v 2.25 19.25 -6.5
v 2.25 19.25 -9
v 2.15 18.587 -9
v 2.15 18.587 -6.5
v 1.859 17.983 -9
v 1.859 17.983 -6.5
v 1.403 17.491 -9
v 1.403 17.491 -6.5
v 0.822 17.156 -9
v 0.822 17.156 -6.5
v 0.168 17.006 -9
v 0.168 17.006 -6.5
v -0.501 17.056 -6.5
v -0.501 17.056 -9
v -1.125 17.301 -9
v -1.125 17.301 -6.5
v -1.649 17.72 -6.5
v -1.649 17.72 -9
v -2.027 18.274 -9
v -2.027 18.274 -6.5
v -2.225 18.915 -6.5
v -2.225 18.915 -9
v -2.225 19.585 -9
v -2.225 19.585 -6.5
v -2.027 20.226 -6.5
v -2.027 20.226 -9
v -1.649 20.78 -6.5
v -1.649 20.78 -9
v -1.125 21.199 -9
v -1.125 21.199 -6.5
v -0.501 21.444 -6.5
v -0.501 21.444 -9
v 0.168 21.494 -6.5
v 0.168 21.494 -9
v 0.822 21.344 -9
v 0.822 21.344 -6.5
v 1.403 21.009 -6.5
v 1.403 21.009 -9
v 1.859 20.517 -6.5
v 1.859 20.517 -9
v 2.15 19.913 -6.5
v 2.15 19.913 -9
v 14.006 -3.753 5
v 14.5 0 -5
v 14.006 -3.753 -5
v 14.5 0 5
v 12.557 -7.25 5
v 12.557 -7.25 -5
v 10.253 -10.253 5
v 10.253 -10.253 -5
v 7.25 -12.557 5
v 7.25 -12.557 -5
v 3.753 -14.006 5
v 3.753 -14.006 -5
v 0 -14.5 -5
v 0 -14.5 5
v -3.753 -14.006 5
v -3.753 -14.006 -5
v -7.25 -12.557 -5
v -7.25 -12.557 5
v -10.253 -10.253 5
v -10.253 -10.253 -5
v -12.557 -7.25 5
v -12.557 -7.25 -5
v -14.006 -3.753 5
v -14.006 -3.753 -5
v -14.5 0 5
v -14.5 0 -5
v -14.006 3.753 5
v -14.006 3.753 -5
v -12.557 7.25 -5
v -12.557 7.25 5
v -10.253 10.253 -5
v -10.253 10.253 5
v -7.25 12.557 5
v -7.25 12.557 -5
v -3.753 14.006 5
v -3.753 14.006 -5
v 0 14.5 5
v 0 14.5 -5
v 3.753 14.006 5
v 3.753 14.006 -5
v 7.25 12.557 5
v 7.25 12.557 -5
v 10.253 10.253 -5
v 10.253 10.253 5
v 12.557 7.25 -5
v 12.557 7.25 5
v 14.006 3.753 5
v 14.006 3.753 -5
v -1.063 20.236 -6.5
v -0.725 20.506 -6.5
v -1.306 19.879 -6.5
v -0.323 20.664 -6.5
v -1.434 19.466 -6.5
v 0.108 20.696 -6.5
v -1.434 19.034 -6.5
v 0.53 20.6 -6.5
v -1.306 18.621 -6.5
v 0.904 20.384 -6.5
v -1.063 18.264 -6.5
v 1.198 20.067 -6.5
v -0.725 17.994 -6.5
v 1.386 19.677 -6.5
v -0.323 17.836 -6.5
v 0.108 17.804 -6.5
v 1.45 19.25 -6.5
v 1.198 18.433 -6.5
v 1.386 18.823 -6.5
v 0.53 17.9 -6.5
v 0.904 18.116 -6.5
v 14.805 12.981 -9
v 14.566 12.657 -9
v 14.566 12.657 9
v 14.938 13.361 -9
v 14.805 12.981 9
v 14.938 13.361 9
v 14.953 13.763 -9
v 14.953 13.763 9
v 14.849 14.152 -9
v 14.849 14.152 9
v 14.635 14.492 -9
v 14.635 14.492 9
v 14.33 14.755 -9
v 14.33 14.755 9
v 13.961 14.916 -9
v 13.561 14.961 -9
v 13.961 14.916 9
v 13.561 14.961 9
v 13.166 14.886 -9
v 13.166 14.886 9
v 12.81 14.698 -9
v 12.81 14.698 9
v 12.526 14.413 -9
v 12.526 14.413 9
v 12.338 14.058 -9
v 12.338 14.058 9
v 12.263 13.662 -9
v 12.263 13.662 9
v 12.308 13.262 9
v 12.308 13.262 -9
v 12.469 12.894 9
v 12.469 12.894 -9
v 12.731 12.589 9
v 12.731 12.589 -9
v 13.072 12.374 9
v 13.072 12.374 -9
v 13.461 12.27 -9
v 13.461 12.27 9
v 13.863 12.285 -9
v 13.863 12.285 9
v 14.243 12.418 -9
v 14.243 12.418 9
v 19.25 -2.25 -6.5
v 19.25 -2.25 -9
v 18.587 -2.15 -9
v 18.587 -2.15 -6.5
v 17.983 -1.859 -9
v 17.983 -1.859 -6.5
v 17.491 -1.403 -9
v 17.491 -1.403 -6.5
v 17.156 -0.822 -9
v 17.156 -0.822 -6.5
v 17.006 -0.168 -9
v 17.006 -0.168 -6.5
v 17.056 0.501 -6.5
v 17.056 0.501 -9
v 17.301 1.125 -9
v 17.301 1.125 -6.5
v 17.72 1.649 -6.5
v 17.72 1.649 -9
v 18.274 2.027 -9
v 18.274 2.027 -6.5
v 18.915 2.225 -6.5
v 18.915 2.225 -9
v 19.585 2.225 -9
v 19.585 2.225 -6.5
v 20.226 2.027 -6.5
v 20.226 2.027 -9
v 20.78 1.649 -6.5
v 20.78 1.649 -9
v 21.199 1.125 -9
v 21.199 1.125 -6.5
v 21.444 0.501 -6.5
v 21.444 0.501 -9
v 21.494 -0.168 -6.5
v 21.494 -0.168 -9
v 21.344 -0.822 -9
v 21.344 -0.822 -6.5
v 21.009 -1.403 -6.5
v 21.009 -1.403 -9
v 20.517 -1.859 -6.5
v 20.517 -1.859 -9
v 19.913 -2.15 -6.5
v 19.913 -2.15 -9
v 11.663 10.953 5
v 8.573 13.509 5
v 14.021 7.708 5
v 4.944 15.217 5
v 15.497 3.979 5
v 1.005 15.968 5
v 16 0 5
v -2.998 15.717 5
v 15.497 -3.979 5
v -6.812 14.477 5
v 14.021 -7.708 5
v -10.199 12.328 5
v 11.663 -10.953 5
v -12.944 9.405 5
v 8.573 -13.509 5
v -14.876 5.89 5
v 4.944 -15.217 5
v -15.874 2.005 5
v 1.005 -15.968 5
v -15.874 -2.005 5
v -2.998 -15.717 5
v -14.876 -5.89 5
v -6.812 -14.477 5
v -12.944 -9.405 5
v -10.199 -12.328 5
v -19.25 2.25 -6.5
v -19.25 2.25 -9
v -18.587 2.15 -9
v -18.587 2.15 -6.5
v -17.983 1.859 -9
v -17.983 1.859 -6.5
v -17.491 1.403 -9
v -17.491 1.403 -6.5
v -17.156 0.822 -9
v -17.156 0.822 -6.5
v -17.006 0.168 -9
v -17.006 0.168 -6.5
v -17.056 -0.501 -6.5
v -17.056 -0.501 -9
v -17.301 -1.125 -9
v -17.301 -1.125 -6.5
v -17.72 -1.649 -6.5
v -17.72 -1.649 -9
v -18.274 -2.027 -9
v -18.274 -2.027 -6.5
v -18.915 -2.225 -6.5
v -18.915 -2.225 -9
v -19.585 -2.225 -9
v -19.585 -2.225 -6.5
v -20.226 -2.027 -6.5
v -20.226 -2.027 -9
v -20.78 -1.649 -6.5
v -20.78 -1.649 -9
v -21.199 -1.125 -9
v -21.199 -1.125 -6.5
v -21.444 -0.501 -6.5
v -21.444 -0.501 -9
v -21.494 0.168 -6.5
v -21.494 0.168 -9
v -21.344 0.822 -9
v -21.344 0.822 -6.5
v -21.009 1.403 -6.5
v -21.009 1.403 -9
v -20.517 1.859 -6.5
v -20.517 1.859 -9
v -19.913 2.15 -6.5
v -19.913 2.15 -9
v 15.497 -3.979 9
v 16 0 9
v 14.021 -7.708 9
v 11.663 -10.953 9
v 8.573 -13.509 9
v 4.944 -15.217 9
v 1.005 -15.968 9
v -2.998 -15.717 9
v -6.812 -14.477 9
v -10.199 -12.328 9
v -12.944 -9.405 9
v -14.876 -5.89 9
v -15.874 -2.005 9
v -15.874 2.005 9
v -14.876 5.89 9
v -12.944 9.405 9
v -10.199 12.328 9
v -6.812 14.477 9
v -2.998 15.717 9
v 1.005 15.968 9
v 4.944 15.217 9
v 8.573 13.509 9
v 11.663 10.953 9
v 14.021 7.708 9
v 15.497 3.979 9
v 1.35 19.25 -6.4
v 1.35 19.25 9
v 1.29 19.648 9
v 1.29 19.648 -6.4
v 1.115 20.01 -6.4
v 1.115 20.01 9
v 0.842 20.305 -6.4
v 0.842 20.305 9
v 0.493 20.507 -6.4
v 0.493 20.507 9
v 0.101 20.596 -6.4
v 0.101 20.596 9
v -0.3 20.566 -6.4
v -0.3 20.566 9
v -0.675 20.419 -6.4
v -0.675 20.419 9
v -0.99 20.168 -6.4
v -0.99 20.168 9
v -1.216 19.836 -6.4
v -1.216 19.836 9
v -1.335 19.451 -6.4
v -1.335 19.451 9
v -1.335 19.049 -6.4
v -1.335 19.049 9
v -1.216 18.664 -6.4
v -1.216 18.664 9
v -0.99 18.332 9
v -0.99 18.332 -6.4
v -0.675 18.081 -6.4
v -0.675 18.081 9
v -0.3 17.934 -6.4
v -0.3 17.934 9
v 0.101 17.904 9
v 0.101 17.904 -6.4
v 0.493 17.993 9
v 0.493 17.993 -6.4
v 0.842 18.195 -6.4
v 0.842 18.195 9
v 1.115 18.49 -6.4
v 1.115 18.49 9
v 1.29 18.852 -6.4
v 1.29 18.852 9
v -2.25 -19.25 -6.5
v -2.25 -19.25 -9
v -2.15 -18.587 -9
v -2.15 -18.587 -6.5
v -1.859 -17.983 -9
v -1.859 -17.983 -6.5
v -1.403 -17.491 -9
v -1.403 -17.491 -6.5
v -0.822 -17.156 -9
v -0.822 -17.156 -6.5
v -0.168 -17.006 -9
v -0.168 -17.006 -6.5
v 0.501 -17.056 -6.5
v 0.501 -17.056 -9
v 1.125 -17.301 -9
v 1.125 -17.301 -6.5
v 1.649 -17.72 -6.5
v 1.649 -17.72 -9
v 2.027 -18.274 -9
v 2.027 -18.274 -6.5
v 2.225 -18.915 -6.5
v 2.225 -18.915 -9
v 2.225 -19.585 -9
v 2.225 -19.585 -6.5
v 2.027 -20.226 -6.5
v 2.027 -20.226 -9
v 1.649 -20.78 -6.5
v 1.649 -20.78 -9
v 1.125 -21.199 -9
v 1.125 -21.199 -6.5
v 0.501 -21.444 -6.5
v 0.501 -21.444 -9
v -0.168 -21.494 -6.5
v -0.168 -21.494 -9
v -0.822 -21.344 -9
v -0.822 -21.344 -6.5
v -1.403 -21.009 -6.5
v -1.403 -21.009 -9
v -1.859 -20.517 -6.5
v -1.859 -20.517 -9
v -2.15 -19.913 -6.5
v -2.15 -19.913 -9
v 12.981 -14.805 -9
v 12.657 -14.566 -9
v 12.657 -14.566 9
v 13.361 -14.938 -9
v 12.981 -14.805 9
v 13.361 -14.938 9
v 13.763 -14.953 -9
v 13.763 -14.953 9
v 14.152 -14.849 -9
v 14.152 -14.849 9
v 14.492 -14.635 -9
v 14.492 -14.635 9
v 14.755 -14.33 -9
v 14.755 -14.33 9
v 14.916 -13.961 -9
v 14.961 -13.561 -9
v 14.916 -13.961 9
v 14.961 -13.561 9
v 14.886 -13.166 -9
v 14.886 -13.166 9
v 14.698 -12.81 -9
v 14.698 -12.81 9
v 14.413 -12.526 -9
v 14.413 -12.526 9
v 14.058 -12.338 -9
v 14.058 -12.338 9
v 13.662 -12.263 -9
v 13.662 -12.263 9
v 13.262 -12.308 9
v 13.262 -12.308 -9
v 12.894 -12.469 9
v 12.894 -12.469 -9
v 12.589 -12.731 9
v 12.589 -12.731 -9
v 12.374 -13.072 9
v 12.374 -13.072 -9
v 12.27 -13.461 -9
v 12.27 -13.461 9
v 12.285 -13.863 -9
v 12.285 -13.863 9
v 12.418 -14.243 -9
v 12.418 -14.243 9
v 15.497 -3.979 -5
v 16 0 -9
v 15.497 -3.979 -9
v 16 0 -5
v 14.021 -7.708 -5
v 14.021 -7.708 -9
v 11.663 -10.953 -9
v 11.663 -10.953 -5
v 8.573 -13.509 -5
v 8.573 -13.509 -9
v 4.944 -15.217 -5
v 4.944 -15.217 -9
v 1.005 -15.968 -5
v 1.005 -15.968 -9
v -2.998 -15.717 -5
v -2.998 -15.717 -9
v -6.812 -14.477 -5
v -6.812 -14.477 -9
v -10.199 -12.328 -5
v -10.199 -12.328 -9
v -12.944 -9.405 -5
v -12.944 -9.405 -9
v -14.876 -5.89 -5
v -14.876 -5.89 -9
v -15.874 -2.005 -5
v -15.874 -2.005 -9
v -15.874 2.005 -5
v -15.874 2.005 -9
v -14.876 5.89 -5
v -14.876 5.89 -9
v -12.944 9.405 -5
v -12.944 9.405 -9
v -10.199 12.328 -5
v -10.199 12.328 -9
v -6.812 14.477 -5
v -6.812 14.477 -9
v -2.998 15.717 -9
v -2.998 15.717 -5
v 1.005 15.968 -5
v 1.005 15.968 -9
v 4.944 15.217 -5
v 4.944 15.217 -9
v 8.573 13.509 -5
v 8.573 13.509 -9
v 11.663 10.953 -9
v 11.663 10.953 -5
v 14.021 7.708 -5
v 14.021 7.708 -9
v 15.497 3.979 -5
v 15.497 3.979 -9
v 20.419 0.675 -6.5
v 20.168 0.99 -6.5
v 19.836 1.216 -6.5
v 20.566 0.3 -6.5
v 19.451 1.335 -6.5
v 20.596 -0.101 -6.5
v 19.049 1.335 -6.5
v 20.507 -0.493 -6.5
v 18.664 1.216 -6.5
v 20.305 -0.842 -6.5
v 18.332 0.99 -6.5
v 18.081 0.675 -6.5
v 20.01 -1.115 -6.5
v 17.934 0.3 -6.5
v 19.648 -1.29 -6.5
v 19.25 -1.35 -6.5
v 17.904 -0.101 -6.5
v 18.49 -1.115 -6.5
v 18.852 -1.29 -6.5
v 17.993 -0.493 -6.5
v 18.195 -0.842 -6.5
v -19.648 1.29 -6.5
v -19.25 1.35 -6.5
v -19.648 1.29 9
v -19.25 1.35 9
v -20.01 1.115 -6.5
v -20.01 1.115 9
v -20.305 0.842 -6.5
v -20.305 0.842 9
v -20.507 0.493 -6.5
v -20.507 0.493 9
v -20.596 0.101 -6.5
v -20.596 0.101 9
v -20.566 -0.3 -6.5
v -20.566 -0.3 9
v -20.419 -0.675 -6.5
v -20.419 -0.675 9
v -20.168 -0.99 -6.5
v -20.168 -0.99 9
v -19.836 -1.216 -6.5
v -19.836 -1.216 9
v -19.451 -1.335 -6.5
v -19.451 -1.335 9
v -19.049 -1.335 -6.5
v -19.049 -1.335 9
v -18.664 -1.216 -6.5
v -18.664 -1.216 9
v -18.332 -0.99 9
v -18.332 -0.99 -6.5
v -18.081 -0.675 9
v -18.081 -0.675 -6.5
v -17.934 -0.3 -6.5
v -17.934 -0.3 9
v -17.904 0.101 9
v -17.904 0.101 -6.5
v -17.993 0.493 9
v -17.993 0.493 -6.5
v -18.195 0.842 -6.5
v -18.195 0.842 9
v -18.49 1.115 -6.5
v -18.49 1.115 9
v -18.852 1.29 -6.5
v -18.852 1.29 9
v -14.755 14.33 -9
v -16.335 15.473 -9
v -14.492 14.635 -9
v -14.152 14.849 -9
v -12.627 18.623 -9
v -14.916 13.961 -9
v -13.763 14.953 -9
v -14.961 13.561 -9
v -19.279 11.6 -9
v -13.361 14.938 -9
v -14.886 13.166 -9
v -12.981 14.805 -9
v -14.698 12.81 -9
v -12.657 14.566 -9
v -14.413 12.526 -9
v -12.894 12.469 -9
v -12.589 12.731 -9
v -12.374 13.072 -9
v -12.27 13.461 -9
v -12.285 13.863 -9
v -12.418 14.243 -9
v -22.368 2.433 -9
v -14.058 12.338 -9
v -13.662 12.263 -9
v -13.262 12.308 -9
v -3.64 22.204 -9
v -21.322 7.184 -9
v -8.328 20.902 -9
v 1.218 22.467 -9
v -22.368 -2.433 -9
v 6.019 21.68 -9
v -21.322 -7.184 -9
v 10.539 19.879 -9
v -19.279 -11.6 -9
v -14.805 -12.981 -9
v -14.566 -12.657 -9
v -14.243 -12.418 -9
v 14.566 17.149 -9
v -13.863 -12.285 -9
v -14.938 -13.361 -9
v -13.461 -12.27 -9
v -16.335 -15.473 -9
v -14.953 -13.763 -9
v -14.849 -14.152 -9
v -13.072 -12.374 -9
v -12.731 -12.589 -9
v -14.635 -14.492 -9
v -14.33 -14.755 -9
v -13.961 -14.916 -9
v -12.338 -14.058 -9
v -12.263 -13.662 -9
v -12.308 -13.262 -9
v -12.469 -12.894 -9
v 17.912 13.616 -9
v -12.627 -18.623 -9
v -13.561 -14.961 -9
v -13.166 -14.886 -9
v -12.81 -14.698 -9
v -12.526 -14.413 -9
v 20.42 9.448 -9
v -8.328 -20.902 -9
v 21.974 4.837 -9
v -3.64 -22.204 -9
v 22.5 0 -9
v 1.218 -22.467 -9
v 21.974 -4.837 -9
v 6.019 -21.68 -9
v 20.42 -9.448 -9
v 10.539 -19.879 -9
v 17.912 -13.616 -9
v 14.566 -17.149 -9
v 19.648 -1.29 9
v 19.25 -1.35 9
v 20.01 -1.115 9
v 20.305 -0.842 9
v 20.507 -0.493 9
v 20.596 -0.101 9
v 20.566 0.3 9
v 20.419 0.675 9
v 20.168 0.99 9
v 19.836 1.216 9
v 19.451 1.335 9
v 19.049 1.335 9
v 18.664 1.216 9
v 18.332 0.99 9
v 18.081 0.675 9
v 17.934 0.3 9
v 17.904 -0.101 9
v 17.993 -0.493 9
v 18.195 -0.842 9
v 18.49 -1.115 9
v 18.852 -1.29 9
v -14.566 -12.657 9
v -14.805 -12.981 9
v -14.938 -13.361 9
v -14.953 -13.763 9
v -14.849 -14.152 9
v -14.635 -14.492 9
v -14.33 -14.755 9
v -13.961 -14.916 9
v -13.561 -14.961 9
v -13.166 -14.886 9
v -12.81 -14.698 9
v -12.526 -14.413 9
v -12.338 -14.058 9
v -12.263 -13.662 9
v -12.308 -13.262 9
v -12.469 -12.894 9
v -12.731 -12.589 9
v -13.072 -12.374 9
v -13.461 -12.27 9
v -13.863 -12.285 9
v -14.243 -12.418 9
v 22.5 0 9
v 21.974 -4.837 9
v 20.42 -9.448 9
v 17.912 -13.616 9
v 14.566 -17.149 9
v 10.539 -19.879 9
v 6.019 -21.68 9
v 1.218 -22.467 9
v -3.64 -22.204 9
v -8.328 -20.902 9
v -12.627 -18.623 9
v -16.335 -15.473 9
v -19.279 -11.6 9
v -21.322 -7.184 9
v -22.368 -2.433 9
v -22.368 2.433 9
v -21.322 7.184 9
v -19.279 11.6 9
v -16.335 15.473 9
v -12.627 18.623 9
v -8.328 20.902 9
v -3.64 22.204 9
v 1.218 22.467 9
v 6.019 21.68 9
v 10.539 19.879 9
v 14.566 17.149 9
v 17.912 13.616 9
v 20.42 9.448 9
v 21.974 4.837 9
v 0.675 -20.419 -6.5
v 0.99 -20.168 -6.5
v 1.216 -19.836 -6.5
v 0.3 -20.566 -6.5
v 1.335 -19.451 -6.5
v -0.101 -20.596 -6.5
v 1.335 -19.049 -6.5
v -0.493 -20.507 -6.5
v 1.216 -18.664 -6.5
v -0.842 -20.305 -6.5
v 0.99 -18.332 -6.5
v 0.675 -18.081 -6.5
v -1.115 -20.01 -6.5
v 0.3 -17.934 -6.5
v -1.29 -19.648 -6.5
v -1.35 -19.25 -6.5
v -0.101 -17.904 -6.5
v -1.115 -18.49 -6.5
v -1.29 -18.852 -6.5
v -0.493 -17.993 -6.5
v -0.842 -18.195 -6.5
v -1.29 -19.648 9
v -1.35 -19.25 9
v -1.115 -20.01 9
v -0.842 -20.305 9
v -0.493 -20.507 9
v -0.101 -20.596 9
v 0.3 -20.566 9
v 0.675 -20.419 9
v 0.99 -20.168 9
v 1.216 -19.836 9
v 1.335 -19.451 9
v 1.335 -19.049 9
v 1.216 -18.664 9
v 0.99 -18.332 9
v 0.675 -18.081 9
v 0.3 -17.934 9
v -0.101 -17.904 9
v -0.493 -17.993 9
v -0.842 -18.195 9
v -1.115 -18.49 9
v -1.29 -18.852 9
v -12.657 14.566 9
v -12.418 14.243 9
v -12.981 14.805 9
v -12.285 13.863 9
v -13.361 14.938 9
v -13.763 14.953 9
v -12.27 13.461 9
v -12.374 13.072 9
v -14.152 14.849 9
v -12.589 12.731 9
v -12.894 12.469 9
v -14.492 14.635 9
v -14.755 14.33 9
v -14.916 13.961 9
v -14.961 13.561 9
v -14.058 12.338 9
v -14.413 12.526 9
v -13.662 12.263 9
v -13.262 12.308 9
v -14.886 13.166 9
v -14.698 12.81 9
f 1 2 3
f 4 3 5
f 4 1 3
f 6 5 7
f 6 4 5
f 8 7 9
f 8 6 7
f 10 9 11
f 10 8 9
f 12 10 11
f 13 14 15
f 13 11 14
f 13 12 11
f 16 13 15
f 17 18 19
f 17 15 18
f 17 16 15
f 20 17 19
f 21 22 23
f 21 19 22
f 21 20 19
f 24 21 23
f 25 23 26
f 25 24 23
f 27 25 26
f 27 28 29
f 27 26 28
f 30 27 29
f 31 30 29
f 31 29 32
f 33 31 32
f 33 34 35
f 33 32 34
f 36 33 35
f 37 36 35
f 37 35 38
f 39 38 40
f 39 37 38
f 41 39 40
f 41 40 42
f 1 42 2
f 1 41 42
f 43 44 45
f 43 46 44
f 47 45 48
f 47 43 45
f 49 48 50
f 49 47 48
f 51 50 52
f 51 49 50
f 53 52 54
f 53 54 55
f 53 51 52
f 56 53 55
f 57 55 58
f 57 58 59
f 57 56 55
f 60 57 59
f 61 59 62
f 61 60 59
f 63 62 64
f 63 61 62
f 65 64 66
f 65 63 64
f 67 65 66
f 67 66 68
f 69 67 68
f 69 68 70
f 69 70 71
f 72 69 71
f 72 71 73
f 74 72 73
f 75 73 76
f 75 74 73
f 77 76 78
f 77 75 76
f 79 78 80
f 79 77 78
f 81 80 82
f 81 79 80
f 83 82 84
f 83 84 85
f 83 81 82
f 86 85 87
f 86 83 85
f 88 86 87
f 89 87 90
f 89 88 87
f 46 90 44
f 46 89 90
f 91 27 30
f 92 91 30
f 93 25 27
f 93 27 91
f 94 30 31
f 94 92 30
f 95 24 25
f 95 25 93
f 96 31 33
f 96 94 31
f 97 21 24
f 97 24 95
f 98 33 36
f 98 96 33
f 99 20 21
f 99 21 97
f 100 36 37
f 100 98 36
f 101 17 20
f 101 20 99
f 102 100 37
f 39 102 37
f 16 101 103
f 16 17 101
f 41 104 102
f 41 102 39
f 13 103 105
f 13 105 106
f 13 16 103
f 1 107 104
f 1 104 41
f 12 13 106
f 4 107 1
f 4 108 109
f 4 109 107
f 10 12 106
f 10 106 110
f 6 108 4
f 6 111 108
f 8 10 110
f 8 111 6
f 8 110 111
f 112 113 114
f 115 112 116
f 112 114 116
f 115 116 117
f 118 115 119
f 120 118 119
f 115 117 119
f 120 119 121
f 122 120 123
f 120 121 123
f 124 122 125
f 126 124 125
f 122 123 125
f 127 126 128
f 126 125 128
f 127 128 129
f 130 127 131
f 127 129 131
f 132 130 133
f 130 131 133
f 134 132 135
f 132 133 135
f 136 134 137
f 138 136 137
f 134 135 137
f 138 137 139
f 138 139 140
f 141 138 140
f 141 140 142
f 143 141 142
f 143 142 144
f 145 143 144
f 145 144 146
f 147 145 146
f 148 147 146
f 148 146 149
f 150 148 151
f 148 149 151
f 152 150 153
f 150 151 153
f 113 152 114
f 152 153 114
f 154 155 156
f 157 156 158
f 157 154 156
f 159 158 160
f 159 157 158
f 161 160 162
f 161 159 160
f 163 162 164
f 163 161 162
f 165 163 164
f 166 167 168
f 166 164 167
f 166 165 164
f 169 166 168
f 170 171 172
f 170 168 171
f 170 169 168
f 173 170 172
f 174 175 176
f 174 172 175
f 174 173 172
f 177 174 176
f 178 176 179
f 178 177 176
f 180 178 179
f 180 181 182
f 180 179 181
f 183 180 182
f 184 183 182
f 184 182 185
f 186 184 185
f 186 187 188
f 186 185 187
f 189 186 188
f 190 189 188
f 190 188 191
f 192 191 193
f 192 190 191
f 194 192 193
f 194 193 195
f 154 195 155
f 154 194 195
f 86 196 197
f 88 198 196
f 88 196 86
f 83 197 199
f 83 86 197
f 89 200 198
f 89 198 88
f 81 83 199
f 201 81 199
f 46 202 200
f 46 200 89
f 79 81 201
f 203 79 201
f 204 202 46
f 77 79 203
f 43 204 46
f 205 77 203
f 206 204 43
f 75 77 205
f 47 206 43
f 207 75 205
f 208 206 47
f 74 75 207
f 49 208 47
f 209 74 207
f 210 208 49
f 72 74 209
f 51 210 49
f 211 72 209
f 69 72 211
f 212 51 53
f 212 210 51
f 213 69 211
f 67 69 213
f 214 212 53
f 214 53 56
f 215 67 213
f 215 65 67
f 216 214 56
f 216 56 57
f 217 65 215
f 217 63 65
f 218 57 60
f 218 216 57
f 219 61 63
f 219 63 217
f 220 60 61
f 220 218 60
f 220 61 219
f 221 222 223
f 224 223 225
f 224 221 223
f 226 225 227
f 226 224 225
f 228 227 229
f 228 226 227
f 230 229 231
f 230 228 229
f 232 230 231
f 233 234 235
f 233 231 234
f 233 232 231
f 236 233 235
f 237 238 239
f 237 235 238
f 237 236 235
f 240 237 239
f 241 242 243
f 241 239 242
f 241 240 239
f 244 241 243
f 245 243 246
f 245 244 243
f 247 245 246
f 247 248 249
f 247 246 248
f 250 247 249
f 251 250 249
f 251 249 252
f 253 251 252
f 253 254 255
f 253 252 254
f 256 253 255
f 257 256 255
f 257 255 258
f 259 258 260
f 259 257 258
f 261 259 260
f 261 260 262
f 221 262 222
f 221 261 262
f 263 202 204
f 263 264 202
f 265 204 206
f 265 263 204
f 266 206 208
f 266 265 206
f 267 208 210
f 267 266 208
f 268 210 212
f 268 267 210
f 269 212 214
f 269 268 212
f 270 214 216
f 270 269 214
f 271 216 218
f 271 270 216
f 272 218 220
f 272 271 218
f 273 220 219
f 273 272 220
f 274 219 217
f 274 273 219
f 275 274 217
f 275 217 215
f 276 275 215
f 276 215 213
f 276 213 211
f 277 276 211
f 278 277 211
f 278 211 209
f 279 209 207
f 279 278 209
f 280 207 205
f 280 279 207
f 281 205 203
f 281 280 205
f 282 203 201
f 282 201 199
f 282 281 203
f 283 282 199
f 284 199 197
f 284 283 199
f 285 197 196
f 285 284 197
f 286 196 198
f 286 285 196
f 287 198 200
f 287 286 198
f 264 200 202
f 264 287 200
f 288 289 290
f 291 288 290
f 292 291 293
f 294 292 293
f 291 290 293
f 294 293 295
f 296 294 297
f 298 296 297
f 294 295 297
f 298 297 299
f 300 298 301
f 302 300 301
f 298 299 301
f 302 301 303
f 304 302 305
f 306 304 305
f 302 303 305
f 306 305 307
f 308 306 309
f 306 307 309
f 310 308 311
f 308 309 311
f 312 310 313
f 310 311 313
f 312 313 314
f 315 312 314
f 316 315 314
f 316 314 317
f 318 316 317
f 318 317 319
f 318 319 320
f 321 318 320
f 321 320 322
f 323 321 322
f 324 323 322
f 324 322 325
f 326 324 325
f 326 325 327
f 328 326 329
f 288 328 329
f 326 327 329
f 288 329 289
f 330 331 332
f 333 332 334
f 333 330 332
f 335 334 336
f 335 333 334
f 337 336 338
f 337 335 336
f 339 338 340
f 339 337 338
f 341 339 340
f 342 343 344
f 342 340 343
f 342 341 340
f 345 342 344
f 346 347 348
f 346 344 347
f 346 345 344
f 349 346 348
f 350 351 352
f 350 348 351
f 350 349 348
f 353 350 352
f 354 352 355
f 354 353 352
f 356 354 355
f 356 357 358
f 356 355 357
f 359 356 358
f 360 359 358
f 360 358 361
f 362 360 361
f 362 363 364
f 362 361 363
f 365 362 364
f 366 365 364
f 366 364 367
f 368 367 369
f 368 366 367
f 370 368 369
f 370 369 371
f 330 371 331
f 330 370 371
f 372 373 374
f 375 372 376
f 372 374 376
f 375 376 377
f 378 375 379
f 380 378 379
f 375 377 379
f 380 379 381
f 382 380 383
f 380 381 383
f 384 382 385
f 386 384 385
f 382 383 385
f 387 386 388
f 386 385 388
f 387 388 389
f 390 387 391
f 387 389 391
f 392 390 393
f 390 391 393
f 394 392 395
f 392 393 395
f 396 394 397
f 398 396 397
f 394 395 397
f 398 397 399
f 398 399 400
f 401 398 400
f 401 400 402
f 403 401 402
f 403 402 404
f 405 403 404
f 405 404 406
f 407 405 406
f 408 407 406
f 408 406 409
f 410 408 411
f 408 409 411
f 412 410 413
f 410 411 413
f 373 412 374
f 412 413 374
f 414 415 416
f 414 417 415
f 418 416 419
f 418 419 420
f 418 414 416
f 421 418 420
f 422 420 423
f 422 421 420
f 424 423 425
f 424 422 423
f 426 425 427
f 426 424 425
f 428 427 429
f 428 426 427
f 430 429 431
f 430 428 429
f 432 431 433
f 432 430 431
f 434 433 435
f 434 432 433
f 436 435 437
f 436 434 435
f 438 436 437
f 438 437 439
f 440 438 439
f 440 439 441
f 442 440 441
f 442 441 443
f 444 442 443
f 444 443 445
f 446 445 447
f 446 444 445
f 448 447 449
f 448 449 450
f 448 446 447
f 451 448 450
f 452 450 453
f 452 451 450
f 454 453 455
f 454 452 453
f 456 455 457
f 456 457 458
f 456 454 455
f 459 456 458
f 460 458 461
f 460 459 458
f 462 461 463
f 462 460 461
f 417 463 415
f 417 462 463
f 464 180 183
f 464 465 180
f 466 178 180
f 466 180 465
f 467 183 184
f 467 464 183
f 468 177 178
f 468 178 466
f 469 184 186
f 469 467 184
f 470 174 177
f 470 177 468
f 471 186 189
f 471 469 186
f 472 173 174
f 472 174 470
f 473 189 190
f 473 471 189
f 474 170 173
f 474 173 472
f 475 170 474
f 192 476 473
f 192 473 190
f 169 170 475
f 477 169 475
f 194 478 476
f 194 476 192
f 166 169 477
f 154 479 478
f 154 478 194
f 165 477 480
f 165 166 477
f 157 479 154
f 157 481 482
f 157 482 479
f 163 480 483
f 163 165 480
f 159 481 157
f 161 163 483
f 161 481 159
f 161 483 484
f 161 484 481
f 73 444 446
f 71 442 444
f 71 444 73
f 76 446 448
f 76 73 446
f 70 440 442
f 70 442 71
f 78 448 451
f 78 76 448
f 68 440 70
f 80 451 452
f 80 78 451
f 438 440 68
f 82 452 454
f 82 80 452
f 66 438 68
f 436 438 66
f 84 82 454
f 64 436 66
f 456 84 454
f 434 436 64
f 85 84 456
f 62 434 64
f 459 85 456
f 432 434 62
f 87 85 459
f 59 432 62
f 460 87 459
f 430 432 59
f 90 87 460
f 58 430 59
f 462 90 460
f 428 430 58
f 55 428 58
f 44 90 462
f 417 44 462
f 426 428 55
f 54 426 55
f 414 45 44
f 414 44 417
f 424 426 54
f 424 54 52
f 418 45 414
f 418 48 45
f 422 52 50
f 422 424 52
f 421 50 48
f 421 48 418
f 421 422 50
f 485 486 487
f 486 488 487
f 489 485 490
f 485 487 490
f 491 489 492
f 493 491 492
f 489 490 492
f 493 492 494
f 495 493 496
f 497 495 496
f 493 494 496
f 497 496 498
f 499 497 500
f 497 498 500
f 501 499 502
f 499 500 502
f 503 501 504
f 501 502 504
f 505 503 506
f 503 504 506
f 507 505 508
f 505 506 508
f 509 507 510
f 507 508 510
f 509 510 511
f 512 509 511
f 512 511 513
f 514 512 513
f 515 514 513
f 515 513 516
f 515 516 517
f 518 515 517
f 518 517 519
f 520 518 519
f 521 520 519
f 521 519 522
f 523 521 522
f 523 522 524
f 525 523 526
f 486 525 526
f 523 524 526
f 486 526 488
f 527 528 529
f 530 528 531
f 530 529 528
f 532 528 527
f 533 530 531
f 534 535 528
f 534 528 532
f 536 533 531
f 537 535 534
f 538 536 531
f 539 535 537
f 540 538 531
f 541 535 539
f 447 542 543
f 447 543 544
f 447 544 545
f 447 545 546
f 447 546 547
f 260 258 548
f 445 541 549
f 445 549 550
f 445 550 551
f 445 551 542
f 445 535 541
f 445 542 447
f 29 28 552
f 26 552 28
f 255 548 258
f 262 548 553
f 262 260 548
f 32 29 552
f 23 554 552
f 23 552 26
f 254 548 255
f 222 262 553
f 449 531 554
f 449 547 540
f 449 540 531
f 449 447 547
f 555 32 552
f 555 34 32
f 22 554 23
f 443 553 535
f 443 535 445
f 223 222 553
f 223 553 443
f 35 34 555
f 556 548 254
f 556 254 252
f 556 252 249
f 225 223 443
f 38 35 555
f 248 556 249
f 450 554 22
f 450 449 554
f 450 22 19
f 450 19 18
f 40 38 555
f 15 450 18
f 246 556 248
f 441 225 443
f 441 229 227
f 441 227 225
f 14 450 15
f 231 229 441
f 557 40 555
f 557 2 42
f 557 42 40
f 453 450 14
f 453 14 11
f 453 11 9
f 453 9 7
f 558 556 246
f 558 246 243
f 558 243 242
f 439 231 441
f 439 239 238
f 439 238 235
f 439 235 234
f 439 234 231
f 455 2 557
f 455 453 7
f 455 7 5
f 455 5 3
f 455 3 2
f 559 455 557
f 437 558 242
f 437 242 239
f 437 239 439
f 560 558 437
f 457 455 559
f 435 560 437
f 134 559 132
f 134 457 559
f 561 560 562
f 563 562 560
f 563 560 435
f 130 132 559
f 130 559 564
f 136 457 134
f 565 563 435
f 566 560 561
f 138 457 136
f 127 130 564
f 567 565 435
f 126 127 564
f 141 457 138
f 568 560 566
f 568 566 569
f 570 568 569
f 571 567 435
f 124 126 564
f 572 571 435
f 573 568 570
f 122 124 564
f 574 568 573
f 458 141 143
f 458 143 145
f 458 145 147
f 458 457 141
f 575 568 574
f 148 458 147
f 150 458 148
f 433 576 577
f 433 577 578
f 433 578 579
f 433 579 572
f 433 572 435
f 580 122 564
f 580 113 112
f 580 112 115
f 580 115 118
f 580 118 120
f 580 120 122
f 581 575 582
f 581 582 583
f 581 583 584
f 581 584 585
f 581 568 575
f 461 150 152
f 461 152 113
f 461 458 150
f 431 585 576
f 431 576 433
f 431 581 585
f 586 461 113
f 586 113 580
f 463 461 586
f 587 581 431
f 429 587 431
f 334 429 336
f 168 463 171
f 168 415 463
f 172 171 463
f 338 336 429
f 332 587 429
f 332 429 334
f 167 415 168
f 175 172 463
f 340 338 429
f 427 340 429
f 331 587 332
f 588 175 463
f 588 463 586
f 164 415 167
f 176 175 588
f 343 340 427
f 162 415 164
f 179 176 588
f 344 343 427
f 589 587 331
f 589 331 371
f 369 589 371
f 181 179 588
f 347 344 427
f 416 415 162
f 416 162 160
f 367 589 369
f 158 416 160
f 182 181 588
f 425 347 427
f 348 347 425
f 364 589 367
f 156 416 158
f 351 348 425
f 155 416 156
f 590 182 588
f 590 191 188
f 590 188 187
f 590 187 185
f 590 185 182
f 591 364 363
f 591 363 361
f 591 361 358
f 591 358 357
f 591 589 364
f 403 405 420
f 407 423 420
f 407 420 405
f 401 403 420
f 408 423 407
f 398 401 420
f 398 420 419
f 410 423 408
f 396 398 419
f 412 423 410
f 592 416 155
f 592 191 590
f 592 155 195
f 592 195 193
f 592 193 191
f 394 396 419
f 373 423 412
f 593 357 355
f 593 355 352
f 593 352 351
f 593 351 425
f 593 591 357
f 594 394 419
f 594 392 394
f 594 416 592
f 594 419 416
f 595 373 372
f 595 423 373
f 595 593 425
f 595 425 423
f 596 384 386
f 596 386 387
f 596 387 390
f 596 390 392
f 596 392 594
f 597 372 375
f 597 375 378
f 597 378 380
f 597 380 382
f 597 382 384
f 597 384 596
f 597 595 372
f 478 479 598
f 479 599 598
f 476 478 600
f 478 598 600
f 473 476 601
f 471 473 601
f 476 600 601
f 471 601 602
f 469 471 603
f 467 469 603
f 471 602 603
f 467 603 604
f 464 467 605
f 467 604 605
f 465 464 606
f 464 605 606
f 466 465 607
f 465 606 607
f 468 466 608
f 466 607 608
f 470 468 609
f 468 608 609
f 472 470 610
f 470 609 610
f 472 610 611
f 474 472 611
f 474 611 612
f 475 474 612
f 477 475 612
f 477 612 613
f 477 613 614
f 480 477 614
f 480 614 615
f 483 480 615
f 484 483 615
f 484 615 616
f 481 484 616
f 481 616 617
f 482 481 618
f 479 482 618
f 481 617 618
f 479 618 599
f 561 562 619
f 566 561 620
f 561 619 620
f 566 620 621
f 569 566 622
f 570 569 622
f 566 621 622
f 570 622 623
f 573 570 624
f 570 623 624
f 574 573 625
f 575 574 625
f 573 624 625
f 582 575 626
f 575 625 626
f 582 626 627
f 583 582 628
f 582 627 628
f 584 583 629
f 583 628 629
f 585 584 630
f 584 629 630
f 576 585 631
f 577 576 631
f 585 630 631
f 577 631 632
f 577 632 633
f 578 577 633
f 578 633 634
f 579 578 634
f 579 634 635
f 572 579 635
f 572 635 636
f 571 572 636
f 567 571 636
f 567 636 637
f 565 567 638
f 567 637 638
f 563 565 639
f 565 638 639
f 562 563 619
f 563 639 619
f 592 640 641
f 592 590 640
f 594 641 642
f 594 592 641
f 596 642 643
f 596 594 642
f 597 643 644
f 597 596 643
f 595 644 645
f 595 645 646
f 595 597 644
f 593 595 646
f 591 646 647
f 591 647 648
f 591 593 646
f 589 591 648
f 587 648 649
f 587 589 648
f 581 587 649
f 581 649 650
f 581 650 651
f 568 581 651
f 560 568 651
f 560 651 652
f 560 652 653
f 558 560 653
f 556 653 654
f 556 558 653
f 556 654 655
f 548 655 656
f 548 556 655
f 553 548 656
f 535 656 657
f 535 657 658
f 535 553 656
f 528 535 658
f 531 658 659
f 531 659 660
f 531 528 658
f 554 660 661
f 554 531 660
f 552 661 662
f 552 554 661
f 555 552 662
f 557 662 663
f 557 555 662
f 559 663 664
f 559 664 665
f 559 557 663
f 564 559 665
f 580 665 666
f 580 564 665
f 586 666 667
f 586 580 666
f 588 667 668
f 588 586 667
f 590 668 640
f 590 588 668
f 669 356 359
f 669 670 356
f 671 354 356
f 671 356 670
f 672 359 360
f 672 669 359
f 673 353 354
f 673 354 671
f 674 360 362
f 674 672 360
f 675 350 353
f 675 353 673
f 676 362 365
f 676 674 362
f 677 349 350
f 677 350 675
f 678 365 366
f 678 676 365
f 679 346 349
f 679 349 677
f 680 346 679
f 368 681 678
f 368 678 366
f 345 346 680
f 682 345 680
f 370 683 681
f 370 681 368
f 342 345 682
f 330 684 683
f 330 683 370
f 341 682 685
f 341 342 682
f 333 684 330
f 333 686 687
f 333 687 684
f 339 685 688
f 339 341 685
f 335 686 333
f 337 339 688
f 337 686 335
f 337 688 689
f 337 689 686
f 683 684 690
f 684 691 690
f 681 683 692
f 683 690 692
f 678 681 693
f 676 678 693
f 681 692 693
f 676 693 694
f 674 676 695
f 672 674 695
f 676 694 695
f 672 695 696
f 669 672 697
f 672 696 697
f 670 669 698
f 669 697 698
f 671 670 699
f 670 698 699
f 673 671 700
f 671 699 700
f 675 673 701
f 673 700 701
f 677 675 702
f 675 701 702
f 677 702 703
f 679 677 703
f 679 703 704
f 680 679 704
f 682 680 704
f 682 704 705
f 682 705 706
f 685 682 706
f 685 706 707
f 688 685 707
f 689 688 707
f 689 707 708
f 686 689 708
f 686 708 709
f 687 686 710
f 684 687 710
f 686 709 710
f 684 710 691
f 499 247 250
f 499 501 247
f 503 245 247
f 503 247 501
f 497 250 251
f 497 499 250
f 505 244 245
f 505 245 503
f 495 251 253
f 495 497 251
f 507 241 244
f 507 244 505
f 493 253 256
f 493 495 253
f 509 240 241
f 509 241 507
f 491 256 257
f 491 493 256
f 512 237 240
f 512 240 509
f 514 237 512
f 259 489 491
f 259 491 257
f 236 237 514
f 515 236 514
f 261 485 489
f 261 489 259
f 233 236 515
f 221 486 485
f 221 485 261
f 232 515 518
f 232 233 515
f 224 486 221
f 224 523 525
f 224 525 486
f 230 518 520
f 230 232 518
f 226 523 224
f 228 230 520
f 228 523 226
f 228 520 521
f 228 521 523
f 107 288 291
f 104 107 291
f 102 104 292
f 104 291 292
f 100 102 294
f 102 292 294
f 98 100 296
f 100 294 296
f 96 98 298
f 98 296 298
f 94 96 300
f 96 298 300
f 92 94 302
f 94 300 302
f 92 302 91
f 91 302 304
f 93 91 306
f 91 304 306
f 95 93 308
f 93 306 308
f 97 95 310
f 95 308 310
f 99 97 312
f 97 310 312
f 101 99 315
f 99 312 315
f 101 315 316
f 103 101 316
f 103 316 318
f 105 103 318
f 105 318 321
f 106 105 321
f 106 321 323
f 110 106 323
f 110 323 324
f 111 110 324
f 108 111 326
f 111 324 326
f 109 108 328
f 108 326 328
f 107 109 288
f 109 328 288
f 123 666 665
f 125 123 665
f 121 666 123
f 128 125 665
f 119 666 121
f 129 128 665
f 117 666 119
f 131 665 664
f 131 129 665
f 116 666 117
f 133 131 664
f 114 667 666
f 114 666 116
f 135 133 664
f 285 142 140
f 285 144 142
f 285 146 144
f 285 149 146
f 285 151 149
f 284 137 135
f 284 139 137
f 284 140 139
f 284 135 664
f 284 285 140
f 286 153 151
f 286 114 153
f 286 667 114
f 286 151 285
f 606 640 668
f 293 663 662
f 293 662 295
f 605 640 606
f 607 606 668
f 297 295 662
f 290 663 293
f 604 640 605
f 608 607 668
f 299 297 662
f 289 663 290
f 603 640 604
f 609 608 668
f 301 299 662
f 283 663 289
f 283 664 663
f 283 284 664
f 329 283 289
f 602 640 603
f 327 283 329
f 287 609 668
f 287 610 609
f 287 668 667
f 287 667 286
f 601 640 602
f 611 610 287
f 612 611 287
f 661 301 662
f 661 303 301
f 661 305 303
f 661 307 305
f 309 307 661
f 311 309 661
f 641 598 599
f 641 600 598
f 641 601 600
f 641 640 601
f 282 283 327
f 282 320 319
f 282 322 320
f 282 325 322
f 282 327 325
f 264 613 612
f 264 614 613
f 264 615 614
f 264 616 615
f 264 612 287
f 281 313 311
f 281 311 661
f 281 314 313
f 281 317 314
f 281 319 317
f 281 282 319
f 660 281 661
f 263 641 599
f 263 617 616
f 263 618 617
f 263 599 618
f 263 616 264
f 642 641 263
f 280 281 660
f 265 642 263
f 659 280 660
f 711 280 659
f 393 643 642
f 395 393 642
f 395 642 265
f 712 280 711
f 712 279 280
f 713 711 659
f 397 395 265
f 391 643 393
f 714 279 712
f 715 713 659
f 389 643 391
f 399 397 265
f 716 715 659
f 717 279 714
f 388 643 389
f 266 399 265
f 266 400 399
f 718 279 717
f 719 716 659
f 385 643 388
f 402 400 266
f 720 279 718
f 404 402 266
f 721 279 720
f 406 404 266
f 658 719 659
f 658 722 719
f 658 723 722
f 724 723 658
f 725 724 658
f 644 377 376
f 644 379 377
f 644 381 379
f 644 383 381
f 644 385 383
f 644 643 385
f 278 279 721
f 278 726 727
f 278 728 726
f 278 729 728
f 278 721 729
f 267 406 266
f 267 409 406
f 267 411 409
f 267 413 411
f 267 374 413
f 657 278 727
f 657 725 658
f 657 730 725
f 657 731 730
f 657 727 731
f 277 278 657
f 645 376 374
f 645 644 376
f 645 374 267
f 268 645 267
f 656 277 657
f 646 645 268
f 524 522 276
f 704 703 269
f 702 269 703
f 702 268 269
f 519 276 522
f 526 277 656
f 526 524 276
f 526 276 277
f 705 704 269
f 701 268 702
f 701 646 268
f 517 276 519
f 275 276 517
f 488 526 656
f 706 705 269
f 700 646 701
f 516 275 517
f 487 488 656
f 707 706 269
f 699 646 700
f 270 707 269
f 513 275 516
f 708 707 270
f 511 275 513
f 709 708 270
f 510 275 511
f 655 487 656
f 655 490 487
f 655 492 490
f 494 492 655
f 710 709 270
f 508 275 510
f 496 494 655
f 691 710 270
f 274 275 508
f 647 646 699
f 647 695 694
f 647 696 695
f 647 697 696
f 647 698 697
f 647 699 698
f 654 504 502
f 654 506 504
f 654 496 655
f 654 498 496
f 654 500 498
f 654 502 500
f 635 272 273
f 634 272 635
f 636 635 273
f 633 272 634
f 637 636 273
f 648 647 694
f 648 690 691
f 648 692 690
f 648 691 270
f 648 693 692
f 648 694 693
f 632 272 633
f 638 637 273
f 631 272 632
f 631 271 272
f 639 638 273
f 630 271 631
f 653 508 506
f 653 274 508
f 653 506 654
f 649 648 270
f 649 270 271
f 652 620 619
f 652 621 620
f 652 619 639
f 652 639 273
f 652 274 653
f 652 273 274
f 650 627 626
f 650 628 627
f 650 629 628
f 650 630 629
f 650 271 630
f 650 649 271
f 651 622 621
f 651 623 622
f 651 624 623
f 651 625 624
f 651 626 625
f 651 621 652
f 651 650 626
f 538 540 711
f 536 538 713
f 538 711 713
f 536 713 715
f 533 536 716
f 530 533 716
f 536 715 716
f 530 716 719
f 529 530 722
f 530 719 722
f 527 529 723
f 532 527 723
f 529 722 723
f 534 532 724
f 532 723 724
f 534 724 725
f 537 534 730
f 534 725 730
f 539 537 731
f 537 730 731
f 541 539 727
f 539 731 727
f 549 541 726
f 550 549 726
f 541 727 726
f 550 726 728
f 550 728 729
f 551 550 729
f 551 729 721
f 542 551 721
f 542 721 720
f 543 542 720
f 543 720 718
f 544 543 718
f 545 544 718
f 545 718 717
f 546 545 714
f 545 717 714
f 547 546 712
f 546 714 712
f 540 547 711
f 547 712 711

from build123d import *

# Parameters (mm, degrees)
SKETCH3_R          = 1.35
CUT_EXTRUDE2_DEPTH = 34.068111528
CUT_EXTRUDE4_START = -2.5
SKETCH4_R          = 2.25
CUT_EXTRUDE4_DEPTH = 40.058172821
CHAMFER1_SIZE      = 0.1
CIRPATTERN3_COUNT  = 4
CIRPATTERN2_COUNT  = 8


with BuildPart() as part:
    # Sketch7 → Revolve1 (revolve)
    with BuildSketch(Plane(origin=(0, 0, 0), x_dir=(1, 0, 0), z_dir=(0, 1, 0))):
        Polygon((16, 9), (16, 5), (14.5, 5), (14.5, -5), (16, -5), (16, -9), (22.5, -9), (22.5, 9), align=None)
    revolve(axis=Axis((0, 0, 9.9), (0, 0, -1)))

    # Sketch3 → Cut-Extrude2 (cut, symmetric)
    with BuildSketch(Plane.XY):
        with Locations((0, 19.25)):
            Circle(SKETCH3_R)
    cut_extrude2 = extrude(amount=CUT_EXTRUDE2_DEPTH, both=True, mode=Mode.SUBTRACT)

    # Sketch4 → Cut-Extrude4 (cut)
    with BuildSketch(Plane(origin=(0, 0, -9), x_dir=(-1, 0, 0), z_dir=(0, 0, -1)).offset(CUT_EXTRUDE4_START)):
        with Locations(Location((0, 19.25, 0), (0, 0, 180))):
            Circle(SKETCH4_R)
    cut_extrude4 = extrude(amount=CUT_EXTRUDE4_DEPTH, mode=Mode.SUBTRACT)

    # Chamfer1
    chamfer1_edges = [part.edges().sort_by_distance(p)[0] for p in [
        (-1.35, 19.25, -6.5),
    ]]
    chamfer(chamfer1_edges, length=CHAMFER1_SIZE)

    # CirPattern3: Cut-Extrude4 ×4 about axis
    cirpattern3_axis = Axis((0, 0, 0), (0, 0, 1))
    for i in range(1, CIRPATTERN3_COUNT):
        add(cut_extrude4.rotate(cirpattern3_axis, i * 360 / CIRPATTERN3_COUNT), mode=Mode.SUBTRACT)

    # CirPattern2: Cut-Extrude2 ×8 about axis
    cirpattern2_axis = Axis((0, 0, 0), (0, 0, 1))
    for i in range(1, CIRPATTERN2_COUNT):
        add(cut_extrude2.rotate(cirpattern2_axis, i * 360 / CIRPATTERN2_COUNT), mode=Mode.SUBTRACT)


solid = part.part
